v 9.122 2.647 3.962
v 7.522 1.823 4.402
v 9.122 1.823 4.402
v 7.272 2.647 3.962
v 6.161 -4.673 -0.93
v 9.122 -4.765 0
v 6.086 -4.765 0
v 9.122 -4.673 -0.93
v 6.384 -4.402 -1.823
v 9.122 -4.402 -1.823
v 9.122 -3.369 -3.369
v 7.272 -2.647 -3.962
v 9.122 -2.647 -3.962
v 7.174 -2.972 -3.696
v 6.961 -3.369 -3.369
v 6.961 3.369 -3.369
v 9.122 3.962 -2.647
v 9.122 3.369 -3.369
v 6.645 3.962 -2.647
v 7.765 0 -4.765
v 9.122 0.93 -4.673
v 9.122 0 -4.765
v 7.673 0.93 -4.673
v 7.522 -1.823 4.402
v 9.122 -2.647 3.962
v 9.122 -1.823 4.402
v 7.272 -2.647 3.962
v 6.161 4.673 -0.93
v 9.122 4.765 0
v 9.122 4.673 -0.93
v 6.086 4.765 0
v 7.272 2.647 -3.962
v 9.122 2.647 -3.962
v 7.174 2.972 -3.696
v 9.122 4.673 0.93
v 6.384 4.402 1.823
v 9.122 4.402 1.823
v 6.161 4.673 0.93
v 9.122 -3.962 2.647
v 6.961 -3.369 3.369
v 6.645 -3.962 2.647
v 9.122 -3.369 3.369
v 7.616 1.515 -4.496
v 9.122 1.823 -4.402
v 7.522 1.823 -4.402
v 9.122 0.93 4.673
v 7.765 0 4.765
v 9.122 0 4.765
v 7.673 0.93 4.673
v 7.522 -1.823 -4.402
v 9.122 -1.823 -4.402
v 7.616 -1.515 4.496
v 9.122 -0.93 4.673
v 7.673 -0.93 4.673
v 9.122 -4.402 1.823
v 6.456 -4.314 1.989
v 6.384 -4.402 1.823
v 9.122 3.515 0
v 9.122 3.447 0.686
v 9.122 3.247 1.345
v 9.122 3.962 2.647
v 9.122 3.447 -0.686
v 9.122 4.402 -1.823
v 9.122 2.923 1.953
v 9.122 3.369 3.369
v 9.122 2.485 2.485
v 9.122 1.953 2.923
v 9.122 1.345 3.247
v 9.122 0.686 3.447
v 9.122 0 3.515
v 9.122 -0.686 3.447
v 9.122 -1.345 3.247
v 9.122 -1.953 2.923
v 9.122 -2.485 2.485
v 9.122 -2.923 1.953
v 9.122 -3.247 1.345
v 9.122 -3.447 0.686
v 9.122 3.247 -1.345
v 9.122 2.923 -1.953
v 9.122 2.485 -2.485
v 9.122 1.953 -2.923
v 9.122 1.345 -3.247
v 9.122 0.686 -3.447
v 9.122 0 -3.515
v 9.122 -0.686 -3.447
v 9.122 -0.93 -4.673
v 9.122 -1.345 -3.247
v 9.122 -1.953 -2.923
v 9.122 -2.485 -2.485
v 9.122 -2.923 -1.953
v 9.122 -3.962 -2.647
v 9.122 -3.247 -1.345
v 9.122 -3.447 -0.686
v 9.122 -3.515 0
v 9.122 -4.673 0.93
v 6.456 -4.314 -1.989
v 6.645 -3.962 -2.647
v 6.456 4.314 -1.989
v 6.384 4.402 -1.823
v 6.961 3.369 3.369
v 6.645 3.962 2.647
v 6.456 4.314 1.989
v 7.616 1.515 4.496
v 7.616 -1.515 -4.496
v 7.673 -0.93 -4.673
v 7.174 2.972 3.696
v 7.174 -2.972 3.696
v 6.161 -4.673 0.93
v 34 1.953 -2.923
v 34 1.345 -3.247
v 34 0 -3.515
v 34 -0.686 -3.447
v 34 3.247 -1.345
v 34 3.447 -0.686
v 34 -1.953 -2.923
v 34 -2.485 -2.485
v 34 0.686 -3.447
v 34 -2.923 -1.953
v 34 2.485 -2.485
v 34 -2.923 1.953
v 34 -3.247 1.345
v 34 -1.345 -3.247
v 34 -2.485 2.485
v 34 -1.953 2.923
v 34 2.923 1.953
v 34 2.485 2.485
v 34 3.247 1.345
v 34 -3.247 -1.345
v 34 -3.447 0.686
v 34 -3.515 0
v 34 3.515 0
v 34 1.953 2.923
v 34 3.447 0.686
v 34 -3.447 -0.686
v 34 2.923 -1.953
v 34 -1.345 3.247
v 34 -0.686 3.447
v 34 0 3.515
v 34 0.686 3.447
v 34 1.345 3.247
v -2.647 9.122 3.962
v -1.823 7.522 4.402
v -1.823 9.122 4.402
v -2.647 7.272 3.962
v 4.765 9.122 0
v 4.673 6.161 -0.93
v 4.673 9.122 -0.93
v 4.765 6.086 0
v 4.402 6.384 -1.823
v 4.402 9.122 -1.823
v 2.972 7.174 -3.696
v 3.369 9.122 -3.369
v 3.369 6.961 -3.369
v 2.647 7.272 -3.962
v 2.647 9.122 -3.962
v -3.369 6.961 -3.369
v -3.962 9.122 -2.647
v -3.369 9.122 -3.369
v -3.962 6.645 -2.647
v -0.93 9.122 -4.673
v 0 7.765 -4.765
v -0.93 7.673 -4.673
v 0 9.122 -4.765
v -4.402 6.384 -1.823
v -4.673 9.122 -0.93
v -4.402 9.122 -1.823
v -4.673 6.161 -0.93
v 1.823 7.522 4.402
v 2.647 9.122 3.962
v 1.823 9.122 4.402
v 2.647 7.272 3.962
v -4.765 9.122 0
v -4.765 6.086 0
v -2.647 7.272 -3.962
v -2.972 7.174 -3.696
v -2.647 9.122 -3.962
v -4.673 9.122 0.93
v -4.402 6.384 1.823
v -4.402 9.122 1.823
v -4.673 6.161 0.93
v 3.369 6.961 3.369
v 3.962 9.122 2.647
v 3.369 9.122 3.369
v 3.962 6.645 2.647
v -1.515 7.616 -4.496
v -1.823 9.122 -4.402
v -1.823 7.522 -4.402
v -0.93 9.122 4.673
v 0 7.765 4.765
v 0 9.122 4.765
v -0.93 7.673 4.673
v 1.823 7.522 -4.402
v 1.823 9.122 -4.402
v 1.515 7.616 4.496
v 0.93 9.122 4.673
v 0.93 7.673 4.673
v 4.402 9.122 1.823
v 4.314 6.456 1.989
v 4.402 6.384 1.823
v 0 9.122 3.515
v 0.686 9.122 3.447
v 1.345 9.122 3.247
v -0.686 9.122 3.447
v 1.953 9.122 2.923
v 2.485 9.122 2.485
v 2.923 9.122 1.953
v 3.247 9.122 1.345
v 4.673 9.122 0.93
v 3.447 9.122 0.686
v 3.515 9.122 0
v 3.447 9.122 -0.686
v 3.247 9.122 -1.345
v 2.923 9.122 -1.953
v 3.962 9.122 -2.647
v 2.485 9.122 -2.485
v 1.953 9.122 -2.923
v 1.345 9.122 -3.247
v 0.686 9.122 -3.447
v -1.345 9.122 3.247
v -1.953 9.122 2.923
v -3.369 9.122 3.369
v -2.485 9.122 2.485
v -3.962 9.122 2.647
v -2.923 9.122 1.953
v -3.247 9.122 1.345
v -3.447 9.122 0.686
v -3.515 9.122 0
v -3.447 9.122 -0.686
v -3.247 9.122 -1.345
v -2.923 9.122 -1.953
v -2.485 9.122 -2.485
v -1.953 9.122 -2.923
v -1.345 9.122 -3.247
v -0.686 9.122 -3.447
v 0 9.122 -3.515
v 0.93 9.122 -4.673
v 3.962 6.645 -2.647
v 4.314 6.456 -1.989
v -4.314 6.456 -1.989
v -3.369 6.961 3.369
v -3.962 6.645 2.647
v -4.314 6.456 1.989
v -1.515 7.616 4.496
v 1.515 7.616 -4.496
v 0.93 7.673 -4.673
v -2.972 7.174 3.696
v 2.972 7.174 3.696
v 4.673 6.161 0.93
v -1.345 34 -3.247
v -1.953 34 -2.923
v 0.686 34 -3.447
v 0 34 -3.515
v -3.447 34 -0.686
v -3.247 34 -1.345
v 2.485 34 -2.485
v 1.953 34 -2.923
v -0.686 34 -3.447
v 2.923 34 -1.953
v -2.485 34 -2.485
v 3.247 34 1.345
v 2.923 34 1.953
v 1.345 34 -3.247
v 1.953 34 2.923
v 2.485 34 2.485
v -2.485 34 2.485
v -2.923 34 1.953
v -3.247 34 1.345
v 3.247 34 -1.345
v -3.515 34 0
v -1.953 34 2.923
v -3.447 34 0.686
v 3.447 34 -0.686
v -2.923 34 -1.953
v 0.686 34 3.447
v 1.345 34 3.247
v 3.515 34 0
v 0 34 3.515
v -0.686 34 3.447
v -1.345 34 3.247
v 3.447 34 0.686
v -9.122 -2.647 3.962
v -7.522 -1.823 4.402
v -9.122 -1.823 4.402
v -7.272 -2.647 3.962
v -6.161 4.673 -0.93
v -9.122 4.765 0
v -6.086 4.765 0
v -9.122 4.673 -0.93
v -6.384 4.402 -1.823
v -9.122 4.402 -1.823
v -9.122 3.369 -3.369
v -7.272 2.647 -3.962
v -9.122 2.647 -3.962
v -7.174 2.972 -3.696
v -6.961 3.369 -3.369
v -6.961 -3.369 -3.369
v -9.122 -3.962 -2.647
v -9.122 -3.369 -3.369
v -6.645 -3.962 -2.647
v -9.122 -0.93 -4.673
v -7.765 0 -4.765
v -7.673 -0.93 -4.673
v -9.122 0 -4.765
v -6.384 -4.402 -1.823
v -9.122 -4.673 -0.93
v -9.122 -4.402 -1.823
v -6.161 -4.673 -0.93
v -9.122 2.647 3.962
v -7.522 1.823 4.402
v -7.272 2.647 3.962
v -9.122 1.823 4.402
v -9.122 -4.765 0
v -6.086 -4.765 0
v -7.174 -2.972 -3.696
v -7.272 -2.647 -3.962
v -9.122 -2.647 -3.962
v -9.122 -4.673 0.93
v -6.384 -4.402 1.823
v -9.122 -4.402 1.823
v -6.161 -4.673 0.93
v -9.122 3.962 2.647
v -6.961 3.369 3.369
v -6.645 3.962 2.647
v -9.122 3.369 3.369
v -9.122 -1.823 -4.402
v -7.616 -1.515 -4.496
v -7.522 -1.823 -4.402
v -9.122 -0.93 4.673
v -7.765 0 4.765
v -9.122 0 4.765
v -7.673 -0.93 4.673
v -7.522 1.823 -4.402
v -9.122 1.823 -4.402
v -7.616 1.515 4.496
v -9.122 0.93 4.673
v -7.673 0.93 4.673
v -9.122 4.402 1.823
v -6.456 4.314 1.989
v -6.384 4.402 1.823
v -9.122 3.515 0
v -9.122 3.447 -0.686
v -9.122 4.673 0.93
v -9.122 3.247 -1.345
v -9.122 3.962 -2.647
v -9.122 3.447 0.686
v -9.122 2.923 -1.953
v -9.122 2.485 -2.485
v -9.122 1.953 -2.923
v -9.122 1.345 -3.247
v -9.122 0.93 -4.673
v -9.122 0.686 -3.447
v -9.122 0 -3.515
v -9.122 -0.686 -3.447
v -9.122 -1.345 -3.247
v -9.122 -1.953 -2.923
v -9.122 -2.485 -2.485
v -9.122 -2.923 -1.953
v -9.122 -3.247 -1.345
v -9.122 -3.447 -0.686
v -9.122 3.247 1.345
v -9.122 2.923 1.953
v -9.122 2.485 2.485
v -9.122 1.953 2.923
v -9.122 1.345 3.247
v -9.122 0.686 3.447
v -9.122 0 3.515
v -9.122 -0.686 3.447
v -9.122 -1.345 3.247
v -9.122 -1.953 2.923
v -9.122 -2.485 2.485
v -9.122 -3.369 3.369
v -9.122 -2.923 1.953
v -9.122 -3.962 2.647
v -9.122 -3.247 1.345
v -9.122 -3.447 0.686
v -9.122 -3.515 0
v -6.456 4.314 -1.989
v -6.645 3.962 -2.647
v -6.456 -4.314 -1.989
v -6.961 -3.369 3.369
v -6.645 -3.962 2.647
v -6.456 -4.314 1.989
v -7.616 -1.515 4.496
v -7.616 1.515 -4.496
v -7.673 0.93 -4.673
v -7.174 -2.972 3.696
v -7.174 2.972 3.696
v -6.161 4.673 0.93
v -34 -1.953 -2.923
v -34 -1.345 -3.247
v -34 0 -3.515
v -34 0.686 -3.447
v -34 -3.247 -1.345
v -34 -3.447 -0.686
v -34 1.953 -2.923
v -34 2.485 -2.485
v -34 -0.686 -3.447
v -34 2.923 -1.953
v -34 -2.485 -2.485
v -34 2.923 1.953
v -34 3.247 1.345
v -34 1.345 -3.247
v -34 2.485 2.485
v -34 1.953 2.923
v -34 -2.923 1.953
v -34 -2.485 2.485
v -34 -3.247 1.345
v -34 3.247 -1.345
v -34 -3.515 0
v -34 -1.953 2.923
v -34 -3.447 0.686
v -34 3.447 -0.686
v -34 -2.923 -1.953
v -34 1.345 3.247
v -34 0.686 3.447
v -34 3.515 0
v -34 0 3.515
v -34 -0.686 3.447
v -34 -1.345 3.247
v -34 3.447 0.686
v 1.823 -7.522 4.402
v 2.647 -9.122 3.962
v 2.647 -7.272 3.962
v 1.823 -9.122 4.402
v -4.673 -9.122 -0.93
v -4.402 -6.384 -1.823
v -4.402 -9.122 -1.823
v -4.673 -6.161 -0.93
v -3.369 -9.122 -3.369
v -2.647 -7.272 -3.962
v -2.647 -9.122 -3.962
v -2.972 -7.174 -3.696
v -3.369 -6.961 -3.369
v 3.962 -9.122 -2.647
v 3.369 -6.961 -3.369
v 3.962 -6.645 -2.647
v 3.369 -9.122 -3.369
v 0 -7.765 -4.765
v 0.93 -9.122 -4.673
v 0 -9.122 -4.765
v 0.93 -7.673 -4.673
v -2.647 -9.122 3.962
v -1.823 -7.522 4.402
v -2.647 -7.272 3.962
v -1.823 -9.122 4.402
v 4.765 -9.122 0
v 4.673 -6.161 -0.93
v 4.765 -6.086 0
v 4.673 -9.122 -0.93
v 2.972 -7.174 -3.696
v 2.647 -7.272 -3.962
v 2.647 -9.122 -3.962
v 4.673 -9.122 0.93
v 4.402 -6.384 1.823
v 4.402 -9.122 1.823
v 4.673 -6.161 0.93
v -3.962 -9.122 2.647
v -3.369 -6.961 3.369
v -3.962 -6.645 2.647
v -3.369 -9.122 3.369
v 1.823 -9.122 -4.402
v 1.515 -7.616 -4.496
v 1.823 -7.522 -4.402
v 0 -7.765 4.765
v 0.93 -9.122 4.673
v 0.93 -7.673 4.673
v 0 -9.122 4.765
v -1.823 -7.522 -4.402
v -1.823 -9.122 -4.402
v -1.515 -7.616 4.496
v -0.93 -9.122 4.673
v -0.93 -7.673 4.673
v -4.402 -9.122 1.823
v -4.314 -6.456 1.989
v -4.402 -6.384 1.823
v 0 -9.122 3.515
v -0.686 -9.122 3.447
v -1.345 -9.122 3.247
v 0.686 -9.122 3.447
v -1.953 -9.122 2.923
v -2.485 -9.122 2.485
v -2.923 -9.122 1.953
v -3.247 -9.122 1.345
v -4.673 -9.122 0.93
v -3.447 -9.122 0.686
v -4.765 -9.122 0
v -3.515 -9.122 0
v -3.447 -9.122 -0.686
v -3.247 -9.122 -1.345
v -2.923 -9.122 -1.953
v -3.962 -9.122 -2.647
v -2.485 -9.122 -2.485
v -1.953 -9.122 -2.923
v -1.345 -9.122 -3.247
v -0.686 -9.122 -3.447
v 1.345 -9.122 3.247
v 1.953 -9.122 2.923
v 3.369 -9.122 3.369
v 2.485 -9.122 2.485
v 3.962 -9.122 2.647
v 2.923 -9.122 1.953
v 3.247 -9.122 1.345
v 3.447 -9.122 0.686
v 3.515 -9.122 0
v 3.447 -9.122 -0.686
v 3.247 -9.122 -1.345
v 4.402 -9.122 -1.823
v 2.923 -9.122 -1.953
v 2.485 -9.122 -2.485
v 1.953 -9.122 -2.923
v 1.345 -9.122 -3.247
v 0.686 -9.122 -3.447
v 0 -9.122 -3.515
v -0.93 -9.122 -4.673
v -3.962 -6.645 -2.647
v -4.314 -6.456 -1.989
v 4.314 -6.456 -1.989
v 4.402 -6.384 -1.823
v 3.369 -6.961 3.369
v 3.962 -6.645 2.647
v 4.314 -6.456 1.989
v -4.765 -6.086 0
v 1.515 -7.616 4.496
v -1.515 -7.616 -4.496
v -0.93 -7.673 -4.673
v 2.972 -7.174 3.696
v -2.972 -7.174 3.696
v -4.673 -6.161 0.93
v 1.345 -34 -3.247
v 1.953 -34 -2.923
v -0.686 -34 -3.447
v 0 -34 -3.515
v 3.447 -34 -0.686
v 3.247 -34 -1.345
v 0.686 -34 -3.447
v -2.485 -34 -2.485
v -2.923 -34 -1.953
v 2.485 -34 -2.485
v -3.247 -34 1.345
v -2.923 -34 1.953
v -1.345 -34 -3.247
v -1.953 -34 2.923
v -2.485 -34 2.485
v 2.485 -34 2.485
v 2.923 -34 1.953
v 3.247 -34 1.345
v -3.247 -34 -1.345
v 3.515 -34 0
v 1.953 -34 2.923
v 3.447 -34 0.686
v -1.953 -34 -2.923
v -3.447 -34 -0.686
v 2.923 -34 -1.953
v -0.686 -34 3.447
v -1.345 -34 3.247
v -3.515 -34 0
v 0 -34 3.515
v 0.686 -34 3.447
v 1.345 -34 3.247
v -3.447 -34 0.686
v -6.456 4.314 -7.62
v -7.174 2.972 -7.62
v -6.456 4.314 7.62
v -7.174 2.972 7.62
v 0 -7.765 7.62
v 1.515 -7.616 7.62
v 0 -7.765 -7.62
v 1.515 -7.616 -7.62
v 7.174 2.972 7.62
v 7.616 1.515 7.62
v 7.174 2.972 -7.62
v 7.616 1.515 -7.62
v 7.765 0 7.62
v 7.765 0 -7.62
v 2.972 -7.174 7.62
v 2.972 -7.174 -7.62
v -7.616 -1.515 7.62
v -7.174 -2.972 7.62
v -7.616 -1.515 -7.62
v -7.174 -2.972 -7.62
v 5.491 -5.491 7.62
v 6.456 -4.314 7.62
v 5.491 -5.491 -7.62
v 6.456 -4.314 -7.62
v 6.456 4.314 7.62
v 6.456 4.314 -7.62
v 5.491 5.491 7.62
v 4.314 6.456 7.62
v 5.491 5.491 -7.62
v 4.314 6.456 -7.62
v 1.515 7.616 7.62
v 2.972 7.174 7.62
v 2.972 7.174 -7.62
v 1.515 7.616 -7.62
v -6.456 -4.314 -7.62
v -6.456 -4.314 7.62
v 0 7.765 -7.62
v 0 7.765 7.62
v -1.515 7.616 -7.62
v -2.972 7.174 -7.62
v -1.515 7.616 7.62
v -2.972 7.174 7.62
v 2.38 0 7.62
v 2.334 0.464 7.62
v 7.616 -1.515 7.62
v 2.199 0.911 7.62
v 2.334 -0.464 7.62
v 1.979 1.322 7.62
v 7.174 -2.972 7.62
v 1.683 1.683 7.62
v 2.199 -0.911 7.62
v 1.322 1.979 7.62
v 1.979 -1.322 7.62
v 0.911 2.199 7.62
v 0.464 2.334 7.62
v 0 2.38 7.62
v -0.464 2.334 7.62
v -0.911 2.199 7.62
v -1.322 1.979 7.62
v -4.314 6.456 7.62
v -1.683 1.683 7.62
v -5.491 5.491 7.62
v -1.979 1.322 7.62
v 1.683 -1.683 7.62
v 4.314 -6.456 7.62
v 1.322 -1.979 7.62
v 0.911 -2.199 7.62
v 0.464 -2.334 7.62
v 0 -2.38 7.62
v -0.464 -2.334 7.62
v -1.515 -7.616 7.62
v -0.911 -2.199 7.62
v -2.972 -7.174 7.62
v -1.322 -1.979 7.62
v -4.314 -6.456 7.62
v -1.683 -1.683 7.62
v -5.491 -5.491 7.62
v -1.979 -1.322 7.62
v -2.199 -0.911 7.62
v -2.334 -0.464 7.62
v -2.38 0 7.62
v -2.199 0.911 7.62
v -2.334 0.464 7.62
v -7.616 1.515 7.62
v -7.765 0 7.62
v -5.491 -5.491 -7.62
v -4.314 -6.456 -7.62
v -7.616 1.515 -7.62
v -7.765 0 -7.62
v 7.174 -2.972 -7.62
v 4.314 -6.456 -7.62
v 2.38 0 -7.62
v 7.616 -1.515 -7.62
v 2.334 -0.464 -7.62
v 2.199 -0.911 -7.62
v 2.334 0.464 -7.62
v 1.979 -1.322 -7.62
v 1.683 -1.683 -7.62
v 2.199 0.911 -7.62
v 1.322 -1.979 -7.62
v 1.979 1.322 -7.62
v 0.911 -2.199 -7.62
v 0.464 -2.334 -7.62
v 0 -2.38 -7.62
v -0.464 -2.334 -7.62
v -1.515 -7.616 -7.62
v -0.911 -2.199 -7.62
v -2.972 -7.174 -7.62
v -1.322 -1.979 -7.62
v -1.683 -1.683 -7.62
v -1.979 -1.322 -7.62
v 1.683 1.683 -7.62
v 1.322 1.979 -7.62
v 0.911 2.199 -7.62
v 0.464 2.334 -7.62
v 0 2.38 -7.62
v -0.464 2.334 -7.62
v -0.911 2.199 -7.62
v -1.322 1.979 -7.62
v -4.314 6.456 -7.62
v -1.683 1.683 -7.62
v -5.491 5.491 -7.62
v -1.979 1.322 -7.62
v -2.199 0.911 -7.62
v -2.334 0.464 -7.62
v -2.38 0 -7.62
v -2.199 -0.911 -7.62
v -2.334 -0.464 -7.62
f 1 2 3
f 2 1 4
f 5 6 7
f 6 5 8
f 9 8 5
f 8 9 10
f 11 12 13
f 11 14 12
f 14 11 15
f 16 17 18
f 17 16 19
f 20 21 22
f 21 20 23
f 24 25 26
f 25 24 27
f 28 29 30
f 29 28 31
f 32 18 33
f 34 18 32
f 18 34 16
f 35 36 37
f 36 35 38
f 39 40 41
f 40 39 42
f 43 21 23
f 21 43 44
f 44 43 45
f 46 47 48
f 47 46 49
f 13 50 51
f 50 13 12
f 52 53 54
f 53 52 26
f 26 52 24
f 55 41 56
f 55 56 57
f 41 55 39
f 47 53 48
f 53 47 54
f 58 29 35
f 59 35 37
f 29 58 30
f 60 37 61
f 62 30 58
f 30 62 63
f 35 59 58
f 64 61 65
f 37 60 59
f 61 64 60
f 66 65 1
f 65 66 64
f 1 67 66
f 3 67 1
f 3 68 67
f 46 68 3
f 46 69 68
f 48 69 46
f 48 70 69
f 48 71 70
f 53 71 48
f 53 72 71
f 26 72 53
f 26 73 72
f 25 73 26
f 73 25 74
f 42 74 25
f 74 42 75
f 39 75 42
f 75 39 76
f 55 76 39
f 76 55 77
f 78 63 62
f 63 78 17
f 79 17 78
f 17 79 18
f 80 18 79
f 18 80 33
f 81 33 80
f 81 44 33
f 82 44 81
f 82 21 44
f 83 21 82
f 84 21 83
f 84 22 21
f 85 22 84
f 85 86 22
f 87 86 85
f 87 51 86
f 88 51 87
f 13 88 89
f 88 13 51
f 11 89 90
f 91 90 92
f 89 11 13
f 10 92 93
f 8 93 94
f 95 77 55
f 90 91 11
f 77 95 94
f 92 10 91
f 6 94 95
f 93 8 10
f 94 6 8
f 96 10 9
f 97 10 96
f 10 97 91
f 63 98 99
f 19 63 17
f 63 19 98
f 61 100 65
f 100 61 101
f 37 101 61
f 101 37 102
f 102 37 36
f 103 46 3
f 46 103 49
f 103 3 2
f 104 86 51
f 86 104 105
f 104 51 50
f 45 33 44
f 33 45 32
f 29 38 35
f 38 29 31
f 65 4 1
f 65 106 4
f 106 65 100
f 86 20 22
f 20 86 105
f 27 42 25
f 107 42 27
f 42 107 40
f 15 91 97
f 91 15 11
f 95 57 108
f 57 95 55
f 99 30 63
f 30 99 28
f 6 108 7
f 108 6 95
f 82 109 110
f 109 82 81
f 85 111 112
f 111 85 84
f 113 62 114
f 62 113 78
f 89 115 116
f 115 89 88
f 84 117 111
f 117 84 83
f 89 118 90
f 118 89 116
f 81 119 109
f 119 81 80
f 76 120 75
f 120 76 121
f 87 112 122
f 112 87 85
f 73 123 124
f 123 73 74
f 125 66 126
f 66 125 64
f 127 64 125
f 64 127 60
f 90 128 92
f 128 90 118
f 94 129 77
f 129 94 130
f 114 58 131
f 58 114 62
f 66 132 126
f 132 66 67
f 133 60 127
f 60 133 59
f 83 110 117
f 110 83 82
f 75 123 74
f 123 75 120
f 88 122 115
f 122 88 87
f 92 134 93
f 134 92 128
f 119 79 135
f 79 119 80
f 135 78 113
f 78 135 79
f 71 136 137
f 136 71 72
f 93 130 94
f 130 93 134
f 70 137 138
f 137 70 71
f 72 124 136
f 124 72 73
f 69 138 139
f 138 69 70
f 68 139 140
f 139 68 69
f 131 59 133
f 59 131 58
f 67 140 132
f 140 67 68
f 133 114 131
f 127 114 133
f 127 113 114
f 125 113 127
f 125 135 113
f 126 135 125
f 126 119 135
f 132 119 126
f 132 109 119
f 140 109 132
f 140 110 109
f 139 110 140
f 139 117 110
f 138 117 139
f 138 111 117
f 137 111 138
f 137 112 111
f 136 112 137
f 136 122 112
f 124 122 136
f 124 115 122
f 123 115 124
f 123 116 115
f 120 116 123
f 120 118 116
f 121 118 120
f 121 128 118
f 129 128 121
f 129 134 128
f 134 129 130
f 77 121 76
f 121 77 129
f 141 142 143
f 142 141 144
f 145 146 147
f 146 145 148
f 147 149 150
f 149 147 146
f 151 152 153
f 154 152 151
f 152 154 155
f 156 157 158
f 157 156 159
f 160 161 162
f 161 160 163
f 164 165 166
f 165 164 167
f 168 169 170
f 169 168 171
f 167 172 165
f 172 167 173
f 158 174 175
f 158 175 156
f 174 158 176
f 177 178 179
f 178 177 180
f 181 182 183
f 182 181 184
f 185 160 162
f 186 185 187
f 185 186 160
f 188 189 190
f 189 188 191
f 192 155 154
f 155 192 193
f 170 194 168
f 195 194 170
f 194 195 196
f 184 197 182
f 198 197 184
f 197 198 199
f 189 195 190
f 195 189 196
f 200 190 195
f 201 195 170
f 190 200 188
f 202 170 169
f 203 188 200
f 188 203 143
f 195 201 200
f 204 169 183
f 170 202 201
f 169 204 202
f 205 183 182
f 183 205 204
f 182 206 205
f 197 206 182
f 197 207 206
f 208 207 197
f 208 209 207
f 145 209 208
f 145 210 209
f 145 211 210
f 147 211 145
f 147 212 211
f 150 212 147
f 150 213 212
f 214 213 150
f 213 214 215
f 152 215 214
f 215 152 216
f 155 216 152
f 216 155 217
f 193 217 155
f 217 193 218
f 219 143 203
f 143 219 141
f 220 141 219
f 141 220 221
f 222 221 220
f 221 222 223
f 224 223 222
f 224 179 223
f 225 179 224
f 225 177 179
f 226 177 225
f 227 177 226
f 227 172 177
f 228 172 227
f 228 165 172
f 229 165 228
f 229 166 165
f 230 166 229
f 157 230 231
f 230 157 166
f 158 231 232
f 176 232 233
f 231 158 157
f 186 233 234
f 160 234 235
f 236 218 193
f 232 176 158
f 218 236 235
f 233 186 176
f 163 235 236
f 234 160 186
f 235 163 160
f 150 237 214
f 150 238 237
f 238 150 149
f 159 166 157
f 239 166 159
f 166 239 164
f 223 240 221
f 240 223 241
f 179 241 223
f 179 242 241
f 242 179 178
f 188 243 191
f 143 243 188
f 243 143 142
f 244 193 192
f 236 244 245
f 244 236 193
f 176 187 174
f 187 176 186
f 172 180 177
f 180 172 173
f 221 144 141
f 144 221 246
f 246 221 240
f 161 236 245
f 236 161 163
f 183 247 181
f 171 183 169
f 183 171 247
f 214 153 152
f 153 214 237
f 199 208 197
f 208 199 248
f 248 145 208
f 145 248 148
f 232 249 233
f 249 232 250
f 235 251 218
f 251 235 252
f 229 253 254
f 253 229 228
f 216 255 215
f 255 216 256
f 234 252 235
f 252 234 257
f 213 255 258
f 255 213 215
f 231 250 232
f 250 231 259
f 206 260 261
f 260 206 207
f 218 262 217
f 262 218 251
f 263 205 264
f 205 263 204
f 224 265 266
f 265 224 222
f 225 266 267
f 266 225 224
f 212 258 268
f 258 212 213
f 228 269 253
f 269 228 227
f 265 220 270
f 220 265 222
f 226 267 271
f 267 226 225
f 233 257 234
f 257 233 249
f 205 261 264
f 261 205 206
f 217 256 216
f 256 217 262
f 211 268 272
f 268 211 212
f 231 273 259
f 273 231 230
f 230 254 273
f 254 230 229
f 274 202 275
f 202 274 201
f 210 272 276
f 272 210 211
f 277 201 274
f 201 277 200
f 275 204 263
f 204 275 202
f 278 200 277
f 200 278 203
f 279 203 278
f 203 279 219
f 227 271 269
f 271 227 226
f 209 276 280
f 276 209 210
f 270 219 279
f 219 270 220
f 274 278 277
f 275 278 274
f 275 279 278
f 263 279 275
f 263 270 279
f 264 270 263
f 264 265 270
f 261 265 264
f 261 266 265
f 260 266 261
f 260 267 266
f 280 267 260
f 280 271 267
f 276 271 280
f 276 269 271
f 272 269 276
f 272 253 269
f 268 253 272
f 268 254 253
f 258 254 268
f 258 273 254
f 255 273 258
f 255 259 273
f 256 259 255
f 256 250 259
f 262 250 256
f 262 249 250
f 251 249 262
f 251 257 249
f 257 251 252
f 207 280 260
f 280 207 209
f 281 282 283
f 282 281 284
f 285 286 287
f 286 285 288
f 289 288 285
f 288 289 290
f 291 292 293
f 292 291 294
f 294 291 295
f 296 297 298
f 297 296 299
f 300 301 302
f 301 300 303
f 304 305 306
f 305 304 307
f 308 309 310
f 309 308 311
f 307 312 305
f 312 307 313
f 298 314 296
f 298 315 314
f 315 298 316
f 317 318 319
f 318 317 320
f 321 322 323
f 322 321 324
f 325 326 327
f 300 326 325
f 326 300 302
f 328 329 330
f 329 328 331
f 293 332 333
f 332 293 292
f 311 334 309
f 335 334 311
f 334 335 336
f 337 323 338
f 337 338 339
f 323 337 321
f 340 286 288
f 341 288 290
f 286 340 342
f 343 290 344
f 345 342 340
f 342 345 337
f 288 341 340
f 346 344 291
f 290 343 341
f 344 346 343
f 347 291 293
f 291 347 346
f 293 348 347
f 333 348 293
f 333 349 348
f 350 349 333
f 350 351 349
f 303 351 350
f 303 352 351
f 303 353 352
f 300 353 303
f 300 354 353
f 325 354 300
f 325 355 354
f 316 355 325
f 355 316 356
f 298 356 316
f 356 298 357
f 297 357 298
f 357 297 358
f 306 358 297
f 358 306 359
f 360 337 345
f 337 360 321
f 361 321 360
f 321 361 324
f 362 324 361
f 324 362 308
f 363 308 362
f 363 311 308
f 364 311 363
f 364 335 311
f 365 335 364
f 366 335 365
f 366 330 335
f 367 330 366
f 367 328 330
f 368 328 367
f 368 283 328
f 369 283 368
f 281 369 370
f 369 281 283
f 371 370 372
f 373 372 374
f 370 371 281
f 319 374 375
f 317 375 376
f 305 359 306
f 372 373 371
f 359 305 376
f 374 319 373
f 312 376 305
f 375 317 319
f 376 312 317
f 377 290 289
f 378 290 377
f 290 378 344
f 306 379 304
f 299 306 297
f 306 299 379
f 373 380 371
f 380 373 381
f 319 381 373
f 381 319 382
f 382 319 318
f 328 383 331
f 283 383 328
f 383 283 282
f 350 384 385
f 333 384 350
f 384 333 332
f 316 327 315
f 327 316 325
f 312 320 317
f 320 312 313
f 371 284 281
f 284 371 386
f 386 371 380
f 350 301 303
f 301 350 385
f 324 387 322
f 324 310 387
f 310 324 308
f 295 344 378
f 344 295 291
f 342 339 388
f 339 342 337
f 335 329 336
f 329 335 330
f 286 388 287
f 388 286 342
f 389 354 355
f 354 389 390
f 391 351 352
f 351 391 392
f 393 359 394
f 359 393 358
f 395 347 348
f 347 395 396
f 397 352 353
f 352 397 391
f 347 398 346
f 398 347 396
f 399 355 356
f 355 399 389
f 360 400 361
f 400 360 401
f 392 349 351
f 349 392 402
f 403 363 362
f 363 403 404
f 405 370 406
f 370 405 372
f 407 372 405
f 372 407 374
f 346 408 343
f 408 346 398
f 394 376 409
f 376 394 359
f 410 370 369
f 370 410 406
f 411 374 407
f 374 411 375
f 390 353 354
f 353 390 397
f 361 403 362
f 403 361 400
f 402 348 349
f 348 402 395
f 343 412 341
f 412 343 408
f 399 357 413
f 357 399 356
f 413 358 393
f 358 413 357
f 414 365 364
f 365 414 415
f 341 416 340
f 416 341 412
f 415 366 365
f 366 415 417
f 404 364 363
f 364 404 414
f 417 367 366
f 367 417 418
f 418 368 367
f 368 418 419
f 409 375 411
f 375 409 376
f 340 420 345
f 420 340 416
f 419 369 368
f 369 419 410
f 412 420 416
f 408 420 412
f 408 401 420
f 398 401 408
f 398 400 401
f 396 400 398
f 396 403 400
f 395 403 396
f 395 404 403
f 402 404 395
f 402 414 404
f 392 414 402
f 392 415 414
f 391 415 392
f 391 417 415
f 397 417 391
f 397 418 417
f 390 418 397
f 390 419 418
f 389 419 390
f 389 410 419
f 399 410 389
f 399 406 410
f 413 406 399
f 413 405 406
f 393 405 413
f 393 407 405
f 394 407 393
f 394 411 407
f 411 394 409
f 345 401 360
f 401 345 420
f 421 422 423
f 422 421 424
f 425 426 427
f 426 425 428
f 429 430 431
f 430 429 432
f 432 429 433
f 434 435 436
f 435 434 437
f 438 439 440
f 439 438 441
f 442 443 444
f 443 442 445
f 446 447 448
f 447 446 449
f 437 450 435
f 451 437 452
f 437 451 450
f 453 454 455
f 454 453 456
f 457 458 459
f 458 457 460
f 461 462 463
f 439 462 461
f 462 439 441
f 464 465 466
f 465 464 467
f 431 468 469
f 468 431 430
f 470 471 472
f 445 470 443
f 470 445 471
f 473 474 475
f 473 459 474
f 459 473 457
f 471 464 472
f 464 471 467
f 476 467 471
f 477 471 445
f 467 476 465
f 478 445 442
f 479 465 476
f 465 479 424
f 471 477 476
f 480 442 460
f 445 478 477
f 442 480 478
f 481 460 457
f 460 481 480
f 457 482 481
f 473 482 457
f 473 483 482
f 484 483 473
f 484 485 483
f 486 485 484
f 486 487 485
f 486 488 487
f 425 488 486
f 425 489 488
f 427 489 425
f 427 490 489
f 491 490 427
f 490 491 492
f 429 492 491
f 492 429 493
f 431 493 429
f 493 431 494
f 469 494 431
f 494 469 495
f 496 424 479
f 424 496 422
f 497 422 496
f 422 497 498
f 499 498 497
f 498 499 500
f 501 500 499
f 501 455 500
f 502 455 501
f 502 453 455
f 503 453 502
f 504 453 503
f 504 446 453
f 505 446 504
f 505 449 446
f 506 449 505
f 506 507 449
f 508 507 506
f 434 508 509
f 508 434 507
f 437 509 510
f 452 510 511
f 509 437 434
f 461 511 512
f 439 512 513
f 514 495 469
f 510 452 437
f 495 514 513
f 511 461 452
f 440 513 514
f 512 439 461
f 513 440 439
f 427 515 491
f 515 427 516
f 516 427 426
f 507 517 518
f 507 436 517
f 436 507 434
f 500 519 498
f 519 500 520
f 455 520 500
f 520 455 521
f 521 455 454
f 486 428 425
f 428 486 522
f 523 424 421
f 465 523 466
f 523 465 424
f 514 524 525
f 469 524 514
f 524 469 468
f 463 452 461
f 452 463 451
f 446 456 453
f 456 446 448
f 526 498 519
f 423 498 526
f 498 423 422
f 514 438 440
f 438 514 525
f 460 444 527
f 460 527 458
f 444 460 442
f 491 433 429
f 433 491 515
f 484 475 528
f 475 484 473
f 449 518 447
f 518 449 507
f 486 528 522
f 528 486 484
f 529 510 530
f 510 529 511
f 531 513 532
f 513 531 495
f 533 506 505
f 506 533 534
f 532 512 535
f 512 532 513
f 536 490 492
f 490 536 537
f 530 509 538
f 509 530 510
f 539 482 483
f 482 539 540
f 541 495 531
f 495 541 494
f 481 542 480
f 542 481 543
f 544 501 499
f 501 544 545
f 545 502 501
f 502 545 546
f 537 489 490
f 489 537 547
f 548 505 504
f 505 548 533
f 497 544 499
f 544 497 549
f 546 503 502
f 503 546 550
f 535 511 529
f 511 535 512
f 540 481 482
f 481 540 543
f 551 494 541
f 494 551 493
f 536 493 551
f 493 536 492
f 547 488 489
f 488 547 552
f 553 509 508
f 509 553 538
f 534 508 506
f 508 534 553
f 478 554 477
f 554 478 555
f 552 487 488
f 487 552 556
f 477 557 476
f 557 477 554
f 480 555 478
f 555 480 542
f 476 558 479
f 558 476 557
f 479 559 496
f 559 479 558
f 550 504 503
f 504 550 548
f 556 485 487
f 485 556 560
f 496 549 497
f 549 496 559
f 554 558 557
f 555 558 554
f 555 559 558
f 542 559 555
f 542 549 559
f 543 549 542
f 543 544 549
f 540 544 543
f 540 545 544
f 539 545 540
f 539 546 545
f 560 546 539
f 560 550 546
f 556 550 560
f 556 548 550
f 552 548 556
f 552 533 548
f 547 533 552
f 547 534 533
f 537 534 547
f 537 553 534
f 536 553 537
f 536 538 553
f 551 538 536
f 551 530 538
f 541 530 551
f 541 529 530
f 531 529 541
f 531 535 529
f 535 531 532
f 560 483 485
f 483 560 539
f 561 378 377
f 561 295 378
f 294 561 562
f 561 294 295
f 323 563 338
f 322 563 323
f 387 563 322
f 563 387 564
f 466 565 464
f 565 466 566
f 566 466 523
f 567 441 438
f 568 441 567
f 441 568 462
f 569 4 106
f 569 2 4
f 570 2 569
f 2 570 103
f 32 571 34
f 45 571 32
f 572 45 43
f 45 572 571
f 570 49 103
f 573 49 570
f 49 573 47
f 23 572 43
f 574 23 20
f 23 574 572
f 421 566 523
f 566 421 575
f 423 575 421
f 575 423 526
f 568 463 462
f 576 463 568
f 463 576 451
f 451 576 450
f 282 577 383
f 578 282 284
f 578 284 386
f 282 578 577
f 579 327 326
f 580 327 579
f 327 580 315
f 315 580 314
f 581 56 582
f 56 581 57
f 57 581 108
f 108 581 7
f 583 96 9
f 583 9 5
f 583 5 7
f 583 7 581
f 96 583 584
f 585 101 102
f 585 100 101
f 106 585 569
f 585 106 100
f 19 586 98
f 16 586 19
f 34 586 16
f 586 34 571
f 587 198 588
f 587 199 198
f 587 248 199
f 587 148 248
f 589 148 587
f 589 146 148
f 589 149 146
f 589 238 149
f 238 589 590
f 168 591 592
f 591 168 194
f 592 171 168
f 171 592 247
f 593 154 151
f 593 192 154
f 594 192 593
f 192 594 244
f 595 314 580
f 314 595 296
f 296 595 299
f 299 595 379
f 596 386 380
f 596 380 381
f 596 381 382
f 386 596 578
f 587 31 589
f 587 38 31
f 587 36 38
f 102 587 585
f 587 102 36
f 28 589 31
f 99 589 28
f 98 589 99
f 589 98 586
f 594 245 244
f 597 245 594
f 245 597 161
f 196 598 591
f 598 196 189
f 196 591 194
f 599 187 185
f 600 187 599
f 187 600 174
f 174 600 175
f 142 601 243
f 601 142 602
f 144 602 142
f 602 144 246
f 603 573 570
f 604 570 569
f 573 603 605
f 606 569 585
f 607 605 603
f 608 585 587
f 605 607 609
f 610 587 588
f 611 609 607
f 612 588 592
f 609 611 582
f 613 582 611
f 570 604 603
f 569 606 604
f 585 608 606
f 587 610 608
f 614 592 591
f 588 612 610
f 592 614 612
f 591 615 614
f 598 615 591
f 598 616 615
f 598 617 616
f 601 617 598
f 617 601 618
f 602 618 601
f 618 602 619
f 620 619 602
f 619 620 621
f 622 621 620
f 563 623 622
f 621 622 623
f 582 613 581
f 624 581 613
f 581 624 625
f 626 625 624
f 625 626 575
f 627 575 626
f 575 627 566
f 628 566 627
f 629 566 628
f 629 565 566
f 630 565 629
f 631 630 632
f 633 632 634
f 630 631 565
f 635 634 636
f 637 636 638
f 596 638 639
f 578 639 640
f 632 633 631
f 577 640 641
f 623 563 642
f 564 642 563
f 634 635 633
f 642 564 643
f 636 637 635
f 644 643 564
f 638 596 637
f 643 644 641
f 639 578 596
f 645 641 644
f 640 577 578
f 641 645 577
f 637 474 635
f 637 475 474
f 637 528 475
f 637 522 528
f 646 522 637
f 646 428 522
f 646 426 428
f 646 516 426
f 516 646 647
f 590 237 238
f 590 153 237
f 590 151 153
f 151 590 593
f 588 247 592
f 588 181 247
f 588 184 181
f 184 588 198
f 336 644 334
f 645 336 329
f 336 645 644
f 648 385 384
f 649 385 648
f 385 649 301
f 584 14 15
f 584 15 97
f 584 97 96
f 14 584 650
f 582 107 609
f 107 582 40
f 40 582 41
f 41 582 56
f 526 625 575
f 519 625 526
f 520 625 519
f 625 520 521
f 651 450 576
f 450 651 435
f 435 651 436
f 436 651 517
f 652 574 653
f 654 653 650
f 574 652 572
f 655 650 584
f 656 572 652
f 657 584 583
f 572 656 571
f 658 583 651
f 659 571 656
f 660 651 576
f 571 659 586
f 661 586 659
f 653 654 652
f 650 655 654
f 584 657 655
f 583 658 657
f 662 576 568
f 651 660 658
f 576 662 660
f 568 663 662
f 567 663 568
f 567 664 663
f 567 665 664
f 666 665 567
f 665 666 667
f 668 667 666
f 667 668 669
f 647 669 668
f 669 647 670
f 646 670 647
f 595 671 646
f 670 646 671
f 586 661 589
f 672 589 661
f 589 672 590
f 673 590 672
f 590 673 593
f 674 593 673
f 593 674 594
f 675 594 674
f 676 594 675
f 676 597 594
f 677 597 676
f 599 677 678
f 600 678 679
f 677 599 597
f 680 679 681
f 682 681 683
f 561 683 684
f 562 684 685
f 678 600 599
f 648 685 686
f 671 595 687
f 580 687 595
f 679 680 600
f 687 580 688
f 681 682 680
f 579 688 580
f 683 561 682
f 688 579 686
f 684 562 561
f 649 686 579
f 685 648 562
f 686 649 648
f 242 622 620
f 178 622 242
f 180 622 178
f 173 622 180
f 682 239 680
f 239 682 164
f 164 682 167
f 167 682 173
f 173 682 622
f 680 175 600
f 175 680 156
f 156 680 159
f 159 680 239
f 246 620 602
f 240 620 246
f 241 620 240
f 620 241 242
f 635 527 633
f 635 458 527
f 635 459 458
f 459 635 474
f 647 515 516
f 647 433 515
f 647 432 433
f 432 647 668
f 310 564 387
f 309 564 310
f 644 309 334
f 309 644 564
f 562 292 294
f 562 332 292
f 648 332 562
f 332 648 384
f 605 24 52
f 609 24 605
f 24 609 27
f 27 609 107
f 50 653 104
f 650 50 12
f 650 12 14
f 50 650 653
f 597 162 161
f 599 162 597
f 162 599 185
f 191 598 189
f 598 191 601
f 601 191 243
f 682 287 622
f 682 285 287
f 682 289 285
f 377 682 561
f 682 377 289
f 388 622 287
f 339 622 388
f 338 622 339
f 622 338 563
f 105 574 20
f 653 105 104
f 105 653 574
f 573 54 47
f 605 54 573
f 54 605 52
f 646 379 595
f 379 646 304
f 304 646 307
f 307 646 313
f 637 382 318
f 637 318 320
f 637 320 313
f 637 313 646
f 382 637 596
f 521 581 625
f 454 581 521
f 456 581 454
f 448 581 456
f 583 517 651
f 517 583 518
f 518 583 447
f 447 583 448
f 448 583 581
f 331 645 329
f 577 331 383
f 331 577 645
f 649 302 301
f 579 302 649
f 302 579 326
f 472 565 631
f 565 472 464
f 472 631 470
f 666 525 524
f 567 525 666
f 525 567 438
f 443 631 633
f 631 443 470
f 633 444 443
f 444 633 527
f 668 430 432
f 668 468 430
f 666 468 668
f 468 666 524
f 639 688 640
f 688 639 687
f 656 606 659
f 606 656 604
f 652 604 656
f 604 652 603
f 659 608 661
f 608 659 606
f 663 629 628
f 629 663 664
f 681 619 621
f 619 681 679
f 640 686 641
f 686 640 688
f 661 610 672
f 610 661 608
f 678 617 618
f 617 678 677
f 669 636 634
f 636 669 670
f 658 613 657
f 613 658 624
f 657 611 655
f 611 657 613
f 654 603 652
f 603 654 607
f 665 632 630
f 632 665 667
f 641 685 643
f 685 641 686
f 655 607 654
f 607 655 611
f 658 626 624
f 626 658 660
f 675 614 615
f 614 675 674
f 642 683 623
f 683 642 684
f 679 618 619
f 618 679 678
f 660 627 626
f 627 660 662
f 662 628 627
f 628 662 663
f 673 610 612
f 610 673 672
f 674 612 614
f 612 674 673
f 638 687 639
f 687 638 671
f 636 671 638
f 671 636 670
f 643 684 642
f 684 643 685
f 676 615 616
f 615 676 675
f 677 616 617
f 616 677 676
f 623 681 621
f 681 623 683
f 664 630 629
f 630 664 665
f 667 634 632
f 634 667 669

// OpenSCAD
$fn = 32;

// ----------------------------------------------------------------------
// Cardan cross: 68 mm span, 9.53 mm trunnions
// ----------------------------------------------------------------------

// --- parameters (mm) ---
journal_d = 9.53;         // trunnion diameter
arm_len = 34;             // trunnion length from the centre
step_r = 3.24;            // step position from the centre
step_d = 7.03;            // journal diameter after the step
hub_d = 15.53;            // hub diameter
hub_h = 15.24;            // hub height
bore_d = 4.76;            // hub bore

difference() {
  union() {
    /* hub along the joint axis */
    cylinder(h = hub_h, d = hub_d, center = true);
    for (a = [0 : 90 : 270]) rotate([0, 0, a]) {
      /* trunnion, sunk into the hub */
      translate([hub_d / 4, 0, 0]) rotate([0, 90, 0]) cylinder(h = step_r + 2, d = journal_d);
      /* stepped journal out to the tip */
      translate([step_r - 0.5, 0, 0]) rotate([0, 90, 0]) cylinder(h = arm_len + 0.5 - step_r, d = step_d);
    }
  }
  /* lubrication bore through the hub, 2.5 mm clear on both sides */
  translate([0, 0, -hub_h / 2 - 2.5]) cylinder(h = hub_h + 5, d = bore_d);
}
